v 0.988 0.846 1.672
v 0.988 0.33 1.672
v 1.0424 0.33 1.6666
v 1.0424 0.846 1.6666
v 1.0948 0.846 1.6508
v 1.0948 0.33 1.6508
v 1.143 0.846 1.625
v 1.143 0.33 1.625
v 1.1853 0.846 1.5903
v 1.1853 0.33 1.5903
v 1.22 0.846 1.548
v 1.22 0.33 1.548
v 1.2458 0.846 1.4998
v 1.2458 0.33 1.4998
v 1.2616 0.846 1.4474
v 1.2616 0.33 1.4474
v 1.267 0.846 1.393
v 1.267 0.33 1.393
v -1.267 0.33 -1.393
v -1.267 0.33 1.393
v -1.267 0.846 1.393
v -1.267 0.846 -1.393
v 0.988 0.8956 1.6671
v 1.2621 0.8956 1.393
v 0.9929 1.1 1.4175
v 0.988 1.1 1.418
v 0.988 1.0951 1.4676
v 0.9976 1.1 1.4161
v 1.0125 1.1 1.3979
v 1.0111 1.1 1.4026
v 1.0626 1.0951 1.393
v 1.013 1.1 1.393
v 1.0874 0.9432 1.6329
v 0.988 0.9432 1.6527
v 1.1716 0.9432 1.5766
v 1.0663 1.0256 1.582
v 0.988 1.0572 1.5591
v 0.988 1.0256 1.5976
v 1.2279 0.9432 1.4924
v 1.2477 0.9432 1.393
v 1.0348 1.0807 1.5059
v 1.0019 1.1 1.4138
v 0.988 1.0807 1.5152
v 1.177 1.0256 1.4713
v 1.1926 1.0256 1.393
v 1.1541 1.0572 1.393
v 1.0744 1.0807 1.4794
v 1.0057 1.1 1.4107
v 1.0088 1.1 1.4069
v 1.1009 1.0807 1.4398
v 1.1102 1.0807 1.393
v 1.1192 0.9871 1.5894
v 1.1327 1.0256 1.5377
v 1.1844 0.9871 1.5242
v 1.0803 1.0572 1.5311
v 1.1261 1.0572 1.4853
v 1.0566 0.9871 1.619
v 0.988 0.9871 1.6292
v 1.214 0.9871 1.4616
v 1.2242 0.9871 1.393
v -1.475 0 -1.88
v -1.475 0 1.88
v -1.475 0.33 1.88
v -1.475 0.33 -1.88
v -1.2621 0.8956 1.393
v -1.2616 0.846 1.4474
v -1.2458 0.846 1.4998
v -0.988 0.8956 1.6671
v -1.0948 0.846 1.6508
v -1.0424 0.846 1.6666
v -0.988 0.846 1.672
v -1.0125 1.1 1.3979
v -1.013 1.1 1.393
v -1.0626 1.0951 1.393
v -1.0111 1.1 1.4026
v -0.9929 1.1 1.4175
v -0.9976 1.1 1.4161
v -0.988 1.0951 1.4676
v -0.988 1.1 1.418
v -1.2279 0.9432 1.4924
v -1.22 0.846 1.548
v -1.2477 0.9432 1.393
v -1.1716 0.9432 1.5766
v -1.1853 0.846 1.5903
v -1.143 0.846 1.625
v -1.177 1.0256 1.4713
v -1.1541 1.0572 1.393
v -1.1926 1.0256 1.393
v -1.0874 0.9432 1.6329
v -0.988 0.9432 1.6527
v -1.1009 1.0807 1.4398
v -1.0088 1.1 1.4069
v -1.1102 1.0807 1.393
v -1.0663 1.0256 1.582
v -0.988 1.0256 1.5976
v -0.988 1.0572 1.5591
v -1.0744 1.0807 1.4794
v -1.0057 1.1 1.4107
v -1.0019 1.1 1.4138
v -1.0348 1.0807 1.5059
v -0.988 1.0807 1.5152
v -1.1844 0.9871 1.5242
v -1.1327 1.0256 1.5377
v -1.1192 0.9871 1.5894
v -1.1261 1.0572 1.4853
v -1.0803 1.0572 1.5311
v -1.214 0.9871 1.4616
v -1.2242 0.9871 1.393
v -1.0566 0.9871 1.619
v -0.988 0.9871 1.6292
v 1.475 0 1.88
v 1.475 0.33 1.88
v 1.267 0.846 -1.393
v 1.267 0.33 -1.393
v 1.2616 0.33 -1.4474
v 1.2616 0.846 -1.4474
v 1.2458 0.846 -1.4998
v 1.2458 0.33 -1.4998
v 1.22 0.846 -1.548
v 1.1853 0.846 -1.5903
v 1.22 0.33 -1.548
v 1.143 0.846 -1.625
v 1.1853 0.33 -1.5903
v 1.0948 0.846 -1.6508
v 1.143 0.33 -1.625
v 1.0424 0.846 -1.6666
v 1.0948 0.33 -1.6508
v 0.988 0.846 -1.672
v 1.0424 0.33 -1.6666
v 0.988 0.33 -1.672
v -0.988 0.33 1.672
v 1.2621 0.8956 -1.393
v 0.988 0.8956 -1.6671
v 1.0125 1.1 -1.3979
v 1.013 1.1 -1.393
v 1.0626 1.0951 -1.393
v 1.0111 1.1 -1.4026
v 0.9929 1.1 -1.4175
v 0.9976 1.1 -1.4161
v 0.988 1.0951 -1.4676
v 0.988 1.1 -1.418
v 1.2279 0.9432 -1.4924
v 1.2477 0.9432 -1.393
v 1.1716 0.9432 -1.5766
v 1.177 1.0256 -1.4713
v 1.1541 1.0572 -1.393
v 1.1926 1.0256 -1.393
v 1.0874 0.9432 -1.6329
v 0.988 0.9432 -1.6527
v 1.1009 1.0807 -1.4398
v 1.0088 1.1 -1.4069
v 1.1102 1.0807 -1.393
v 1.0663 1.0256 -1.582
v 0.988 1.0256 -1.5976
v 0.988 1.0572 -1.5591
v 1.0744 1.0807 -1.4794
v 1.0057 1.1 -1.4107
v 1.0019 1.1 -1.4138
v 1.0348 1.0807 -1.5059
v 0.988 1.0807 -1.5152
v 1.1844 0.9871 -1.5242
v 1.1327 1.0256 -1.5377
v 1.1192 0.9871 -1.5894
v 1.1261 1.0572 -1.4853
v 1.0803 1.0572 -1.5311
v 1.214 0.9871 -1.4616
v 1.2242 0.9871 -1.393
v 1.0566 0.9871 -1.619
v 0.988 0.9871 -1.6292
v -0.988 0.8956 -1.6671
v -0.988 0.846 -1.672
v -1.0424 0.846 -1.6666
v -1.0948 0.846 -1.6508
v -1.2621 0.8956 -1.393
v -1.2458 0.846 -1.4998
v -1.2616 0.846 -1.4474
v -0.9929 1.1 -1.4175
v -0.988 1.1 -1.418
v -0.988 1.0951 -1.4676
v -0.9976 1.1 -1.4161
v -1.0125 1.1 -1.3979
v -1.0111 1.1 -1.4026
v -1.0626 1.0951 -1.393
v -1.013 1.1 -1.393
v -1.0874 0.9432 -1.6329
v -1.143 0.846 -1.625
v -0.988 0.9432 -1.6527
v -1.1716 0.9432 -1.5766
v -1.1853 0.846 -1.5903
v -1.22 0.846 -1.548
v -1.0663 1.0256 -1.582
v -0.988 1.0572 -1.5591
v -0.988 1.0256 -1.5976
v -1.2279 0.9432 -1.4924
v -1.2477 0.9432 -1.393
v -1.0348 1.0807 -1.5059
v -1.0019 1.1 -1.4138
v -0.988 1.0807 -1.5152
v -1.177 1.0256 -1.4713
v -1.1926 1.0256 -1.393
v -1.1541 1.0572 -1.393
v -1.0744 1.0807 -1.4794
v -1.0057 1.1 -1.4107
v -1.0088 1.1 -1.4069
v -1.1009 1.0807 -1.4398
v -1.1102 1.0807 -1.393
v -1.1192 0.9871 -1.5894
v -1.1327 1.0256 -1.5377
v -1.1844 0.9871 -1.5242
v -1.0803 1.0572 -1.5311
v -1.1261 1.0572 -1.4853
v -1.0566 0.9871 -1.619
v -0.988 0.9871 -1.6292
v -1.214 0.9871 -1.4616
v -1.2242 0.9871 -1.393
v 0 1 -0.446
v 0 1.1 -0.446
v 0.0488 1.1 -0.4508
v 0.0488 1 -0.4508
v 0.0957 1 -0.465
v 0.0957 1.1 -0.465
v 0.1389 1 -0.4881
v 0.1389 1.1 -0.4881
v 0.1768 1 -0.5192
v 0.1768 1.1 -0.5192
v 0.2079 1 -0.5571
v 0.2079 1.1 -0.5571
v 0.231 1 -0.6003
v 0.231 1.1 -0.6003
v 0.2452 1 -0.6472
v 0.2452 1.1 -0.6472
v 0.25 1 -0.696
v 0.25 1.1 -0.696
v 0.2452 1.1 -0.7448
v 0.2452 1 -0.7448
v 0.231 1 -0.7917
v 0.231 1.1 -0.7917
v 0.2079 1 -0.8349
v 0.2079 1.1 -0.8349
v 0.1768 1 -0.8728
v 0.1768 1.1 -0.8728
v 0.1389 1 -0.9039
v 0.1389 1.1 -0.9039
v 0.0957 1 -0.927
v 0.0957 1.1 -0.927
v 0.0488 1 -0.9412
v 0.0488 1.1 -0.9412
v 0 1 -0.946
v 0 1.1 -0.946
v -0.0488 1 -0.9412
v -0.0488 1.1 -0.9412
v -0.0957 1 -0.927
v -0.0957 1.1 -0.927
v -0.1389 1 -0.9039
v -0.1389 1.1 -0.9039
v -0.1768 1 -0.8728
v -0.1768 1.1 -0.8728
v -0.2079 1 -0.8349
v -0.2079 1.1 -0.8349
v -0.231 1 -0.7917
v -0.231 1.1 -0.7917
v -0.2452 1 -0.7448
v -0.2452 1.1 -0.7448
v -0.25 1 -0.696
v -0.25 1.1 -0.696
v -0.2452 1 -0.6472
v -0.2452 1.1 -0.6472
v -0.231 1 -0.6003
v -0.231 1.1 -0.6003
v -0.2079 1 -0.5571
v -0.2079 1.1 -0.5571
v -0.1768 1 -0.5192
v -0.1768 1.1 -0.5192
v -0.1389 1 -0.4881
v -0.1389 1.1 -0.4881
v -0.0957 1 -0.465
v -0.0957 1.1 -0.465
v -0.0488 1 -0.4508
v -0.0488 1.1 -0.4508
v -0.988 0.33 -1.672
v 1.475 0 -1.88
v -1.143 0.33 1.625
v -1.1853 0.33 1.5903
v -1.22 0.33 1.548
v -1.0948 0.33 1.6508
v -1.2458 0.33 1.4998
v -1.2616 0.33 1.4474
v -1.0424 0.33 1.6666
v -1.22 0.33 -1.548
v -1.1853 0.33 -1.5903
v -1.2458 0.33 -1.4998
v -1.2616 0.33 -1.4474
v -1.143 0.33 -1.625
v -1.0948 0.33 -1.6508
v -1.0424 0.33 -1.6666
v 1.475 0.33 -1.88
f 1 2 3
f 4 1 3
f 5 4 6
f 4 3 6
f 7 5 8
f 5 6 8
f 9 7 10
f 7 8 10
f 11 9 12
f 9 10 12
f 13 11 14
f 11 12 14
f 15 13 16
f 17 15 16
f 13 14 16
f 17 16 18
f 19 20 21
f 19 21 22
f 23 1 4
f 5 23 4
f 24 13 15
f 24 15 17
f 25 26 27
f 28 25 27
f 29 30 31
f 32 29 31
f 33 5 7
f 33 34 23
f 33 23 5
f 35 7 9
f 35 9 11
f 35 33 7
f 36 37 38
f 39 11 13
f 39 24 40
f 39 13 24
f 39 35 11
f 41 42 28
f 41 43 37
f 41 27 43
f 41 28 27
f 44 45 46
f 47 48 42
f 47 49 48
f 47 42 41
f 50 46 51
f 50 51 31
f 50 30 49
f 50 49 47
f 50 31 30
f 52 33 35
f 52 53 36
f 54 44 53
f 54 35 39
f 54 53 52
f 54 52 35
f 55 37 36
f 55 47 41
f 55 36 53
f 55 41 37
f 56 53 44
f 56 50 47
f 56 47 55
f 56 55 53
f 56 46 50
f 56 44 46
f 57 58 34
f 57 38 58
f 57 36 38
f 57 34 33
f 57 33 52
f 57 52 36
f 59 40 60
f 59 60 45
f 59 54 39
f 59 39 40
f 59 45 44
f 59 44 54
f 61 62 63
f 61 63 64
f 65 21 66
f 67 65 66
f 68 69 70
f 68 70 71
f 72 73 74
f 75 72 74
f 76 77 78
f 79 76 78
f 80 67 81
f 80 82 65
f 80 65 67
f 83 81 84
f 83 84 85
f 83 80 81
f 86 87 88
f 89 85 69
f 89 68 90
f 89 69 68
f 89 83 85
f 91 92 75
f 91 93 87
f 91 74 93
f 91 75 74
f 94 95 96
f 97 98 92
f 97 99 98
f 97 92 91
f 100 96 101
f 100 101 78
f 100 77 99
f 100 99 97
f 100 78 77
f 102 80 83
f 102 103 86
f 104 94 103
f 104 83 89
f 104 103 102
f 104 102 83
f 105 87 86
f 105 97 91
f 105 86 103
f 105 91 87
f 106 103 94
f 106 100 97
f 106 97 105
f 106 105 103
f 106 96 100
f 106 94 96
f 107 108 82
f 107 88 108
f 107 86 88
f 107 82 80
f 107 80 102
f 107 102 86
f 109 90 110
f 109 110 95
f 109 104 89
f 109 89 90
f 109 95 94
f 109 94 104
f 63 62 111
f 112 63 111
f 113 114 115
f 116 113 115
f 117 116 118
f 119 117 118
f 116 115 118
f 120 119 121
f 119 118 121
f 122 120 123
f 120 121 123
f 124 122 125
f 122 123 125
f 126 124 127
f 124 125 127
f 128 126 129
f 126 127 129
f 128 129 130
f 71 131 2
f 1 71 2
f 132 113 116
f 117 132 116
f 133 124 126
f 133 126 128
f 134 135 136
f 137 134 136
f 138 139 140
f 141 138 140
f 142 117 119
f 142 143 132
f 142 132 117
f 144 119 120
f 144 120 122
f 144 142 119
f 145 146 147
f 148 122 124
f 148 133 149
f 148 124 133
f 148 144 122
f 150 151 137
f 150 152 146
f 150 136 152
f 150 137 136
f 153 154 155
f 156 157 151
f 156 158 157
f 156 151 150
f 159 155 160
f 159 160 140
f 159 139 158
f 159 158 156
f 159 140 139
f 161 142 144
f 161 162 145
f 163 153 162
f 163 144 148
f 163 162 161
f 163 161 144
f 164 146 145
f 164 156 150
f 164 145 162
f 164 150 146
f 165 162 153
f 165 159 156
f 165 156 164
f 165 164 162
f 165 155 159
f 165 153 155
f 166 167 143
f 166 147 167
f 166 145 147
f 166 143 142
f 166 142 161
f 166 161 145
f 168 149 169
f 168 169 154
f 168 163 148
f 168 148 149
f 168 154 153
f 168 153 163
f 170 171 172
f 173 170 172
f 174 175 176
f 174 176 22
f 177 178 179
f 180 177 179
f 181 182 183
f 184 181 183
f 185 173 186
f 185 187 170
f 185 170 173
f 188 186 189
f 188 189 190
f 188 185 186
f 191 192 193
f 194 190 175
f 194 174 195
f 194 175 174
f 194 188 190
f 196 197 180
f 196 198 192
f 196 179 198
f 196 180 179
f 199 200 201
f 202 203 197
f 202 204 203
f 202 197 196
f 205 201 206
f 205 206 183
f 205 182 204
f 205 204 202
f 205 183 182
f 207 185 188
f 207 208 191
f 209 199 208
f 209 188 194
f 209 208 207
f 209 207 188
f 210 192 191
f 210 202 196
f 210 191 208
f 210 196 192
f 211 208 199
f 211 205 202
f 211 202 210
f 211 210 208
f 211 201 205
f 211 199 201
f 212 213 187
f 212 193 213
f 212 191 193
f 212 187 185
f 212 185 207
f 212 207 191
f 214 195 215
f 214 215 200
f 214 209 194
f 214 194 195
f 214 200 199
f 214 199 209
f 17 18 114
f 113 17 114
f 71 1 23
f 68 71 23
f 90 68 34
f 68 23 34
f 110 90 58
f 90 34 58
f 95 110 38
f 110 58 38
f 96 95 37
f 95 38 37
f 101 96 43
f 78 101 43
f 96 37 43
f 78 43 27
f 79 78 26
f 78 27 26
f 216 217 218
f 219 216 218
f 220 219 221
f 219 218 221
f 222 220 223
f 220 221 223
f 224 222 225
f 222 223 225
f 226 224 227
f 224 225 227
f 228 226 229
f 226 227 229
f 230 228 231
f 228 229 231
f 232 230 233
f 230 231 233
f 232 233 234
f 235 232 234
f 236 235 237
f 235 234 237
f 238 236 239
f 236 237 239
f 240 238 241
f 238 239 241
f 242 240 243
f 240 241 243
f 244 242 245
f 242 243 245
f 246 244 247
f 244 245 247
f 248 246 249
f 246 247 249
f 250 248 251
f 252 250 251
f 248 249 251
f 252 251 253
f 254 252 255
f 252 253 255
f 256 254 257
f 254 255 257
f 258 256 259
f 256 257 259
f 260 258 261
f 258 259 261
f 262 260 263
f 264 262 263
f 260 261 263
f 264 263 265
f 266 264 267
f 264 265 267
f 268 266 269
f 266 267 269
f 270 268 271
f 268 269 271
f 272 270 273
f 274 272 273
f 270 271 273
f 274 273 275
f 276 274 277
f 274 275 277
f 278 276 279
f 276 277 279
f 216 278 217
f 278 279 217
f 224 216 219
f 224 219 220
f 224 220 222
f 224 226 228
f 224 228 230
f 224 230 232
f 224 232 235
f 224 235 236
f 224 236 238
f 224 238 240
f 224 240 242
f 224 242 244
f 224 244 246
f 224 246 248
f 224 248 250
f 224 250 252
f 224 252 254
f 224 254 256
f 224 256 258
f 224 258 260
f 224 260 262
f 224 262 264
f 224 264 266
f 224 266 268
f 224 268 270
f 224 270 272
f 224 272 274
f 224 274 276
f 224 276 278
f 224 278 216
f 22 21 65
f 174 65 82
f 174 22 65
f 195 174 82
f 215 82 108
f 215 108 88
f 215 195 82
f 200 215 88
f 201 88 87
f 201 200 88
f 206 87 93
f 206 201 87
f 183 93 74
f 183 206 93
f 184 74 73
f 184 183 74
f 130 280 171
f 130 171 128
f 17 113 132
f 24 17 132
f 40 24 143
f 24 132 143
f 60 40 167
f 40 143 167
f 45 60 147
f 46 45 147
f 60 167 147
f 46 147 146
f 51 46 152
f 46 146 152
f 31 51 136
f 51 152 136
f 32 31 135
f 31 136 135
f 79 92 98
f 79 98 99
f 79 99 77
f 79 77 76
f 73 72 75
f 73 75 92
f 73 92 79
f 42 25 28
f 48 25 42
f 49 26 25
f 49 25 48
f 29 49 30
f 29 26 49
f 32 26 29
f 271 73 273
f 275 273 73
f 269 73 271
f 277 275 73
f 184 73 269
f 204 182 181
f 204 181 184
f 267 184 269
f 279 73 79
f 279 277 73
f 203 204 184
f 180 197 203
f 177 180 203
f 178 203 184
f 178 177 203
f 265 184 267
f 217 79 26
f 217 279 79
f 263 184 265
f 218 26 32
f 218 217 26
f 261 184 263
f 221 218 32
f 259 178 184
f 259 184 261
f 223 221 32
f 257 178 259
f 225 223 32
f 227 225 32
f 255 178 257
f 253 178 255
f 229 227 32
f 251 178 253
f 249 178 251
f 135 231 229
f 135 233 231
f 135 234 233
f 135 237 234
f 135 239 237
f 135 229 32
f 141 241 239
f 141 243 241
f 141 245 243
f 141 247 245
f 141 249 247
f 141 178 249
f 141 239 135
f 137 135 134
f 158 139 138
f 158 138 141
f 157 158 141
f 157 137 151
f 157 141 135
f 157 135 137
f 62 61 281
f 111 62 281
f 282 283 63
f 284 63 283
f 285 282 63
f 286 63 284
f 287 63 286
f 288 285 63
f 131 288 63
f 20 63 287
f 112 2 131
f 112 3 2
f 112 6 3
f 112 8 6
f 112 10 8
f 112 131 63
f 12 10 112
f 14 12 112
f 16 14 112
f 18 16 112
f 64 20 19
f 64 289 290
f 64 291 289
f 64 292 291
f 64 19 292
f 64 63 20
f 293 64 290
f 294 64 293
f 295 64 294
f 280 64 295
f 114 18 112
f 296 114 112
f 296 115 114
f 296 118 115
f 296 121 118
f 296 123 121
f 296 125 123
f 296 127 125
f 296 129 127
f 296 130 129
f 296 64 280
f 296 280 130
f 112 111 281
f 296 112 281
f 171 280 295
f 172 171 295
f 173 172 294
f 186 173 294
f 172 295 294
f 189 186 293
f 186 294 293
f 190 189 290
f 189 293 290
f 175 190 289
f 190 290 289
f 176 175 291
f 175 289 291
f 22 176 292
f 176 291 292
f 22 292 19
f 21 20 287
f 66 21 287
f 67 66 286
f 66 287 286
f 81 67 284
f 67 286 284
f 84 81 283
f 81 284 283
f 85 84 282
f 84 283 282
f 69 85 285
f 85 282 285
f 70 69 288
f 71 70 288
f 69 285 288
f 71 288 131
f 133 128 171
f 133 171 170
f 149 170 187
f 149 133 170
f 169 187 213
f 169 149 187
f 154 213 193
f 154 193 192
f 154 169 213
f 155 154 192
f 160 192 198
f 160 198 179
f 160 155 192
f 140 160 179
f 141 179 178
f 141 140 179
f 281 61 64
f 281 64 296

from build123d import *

# Parameters (mm, degrees)
SKETCH1_W           = 2.95
SKETCH1_H           = 3.76
BOSS_EXTRUDE1_DEPTH = 0.33
SKETCH2_W           = 2.534
SKETCH2_H           = 3.344
BOSS_EXTRUDE2_DEPTH = 0.77
FILLET1_R           = 0.254
FILLET2_R           = 0.279
SKETCH3_R           = 0.25
CUT_EXTRUDE1_DEPTH  = 0.1


with BuildPart() as part:
    # Sketch1 → Boss-Extrude1 (new body)
    with BuildSketch(Plane(origin=(0, 0, 0), x_dir=(1, 0, 0), z_dir=(0, 1, 0))):
        Rectangle(SKETCH1_W, SKETCH1_H)
    extrude(amount=BOSS_EXTRUDE1_DEPTH)

    # Sketch2 → Boss-Extrude2 (add)
    with BuildSketch(Plane(origin=(0, 0.33, 0), x_dir=(1, 0, 0), z_dir=(0, 1, 0))):
        Rectangle(SKETCH2_W, SKETCH2_H)
    extrude(amount=BOSS_EXTRUDE2_DEPTH)

    # Fillet1
    fillet1_edges = [part.edges().sort_by_distance(p)[0] for p in [
        (1.267, 1.1, 0),
        (0, 1.1, -1.672),
        (-1.267, 1.1, 0),
        (0, 1.1, 1.672),
    ]]
    fillet(fillet1_edges, radius=FILLET1_R)

    # Fillet2
    # the kernel refuses this fillet: 0.279 mm, written as the material it takes off along each edge
    with BuildSketch(Plane(origin=(-0.988, 1.1, -1.393), x_dir=(0, 0, -1), z_dir=(1, 0, 0))) as fillet2_piece_1:
        with BuildLine():
            CenterArc((0.025, -0.254), 0.254, 0, 90)
            Line((0.279, -0.254), (0.279, 0))
            Line((0.279, 0), (0.025, 0))
        make_face()
    revolve(axis=Axis((-0.988, 1.1, -1.393), (0, 1, 0)), revolution_arc=90, mode=Mode.SUBTRACT)
    with BuildSketch(Plane(origin=(0.988, 1.1, -1.393), x_dir=(1, 0, 0), z_dir=(0, 0, 1))) as fillet2_piece_2:
        with BuildLine():
            CenterArc((0.025, -0.254), 0.254, 0, 90)
            Line((0.279, -0.254), (0.279, 0))
            Line((0.279, 0), (0.025, 0))
        make_face()
    revolve(axis=Axis((0.988, 1.1, -1.393), (0, 1, 0)), revolution_arc=90, mode=Mode.SUBTRACT)
    with BuildSketch(Plane(origin=(-0.988, 1.1, 1.393), x_dir=(-1, 0, 0), z_dir=(0, 0, -1))) as fillet2_piece_3:
        with BuildLine():
            CenterArc((0.025, -0.254), 0.254, 0, 90)
            Line((0.279, -0.254), (0.279, 0))
            Line((0.279, 0), (0.025, 0))
        make_face()
    revolve(axis=Axis((-0.988, 1.1, 1.393), (0, 1, 0)), revolution_arc=90, mode=Mode.SUBTRACT)
    with BuildSketch(Plane(origin=(0.988, 1.1, 1.393), x_dir=(0, 0, 1), z_dir=(-1, 0, 0))) as fillet2_piece_4:
        with BuildLine():
            CenterArc((0.025, -0.254), 0.254, 0, 90)
            Line((0.279, -0.254), (0.279, 0))
            Line((0.279, 0), (0.025, 0))
        make_face()
    revolve(axis=Axis((0.988, 1.1, 1.393), (0, 1, 0)), revolution_arc=90, mode=Mode.SUBTRACT)
    with BuildSketch(Plane(origin=(1.267, 0.33, 1.672), x_dir=(-1, 0, 0), z_dir=(0, 1, 0)), Plane(origin=(-1.267, 0.33, 1.672), x_dir=(0, 0, -1), z_dir=(0, 1, 0))) as fillet2_piece_5:
        with BuildLine():
            CenterArc((FILLET2_R, -FILLET2_R), FILLET2_R, 90, 90)
            Line((0, -FILLET2_R), (0, 0))
            Line((0, 0), (FILLET2_R, 0))
        make_face()
    extrude(amount=0.77, mode=Mode.SUBTRACT)
    with BuildSketch(Plane(origin=(-1.267, 0.33, -1.672), x_dir=(0, 0, 1), z_dir=(0, 1, 0)), Plane(origin=(1.267, 0.33, -1.672), x_dir=(-1, 0, 0), z_dir=(0, 1, 0))) as fillet2_piece_6:
        with BuildLine():
            CenterArc((FILLET2_R, FILLET2_R), FILLET2_R, 180, 90)
            Line((0, FILLET2_R), (0, 0))
            Line((0, 0), (FILLET2_R, 0))
        make_face()
    extrude(amount=0.77, mode=Mode.SUBTRACT)

    # Sketch3 → Cut-Extrude1 (cut)
    with BuildSketch(Plane(origin=(0, 1.1, 0), x_dir=(1, 0, 0), z_dir=(0, 1, 0))):
        with Locations(Location((0, 0.696, 0), (0, 0, 270))):
            Circle(SKETCH3_R)
    extrude(amount=-CUT_EXTRUDE1_DEPTH, mode=Mode.SUBTRACT)


solid = part.part
